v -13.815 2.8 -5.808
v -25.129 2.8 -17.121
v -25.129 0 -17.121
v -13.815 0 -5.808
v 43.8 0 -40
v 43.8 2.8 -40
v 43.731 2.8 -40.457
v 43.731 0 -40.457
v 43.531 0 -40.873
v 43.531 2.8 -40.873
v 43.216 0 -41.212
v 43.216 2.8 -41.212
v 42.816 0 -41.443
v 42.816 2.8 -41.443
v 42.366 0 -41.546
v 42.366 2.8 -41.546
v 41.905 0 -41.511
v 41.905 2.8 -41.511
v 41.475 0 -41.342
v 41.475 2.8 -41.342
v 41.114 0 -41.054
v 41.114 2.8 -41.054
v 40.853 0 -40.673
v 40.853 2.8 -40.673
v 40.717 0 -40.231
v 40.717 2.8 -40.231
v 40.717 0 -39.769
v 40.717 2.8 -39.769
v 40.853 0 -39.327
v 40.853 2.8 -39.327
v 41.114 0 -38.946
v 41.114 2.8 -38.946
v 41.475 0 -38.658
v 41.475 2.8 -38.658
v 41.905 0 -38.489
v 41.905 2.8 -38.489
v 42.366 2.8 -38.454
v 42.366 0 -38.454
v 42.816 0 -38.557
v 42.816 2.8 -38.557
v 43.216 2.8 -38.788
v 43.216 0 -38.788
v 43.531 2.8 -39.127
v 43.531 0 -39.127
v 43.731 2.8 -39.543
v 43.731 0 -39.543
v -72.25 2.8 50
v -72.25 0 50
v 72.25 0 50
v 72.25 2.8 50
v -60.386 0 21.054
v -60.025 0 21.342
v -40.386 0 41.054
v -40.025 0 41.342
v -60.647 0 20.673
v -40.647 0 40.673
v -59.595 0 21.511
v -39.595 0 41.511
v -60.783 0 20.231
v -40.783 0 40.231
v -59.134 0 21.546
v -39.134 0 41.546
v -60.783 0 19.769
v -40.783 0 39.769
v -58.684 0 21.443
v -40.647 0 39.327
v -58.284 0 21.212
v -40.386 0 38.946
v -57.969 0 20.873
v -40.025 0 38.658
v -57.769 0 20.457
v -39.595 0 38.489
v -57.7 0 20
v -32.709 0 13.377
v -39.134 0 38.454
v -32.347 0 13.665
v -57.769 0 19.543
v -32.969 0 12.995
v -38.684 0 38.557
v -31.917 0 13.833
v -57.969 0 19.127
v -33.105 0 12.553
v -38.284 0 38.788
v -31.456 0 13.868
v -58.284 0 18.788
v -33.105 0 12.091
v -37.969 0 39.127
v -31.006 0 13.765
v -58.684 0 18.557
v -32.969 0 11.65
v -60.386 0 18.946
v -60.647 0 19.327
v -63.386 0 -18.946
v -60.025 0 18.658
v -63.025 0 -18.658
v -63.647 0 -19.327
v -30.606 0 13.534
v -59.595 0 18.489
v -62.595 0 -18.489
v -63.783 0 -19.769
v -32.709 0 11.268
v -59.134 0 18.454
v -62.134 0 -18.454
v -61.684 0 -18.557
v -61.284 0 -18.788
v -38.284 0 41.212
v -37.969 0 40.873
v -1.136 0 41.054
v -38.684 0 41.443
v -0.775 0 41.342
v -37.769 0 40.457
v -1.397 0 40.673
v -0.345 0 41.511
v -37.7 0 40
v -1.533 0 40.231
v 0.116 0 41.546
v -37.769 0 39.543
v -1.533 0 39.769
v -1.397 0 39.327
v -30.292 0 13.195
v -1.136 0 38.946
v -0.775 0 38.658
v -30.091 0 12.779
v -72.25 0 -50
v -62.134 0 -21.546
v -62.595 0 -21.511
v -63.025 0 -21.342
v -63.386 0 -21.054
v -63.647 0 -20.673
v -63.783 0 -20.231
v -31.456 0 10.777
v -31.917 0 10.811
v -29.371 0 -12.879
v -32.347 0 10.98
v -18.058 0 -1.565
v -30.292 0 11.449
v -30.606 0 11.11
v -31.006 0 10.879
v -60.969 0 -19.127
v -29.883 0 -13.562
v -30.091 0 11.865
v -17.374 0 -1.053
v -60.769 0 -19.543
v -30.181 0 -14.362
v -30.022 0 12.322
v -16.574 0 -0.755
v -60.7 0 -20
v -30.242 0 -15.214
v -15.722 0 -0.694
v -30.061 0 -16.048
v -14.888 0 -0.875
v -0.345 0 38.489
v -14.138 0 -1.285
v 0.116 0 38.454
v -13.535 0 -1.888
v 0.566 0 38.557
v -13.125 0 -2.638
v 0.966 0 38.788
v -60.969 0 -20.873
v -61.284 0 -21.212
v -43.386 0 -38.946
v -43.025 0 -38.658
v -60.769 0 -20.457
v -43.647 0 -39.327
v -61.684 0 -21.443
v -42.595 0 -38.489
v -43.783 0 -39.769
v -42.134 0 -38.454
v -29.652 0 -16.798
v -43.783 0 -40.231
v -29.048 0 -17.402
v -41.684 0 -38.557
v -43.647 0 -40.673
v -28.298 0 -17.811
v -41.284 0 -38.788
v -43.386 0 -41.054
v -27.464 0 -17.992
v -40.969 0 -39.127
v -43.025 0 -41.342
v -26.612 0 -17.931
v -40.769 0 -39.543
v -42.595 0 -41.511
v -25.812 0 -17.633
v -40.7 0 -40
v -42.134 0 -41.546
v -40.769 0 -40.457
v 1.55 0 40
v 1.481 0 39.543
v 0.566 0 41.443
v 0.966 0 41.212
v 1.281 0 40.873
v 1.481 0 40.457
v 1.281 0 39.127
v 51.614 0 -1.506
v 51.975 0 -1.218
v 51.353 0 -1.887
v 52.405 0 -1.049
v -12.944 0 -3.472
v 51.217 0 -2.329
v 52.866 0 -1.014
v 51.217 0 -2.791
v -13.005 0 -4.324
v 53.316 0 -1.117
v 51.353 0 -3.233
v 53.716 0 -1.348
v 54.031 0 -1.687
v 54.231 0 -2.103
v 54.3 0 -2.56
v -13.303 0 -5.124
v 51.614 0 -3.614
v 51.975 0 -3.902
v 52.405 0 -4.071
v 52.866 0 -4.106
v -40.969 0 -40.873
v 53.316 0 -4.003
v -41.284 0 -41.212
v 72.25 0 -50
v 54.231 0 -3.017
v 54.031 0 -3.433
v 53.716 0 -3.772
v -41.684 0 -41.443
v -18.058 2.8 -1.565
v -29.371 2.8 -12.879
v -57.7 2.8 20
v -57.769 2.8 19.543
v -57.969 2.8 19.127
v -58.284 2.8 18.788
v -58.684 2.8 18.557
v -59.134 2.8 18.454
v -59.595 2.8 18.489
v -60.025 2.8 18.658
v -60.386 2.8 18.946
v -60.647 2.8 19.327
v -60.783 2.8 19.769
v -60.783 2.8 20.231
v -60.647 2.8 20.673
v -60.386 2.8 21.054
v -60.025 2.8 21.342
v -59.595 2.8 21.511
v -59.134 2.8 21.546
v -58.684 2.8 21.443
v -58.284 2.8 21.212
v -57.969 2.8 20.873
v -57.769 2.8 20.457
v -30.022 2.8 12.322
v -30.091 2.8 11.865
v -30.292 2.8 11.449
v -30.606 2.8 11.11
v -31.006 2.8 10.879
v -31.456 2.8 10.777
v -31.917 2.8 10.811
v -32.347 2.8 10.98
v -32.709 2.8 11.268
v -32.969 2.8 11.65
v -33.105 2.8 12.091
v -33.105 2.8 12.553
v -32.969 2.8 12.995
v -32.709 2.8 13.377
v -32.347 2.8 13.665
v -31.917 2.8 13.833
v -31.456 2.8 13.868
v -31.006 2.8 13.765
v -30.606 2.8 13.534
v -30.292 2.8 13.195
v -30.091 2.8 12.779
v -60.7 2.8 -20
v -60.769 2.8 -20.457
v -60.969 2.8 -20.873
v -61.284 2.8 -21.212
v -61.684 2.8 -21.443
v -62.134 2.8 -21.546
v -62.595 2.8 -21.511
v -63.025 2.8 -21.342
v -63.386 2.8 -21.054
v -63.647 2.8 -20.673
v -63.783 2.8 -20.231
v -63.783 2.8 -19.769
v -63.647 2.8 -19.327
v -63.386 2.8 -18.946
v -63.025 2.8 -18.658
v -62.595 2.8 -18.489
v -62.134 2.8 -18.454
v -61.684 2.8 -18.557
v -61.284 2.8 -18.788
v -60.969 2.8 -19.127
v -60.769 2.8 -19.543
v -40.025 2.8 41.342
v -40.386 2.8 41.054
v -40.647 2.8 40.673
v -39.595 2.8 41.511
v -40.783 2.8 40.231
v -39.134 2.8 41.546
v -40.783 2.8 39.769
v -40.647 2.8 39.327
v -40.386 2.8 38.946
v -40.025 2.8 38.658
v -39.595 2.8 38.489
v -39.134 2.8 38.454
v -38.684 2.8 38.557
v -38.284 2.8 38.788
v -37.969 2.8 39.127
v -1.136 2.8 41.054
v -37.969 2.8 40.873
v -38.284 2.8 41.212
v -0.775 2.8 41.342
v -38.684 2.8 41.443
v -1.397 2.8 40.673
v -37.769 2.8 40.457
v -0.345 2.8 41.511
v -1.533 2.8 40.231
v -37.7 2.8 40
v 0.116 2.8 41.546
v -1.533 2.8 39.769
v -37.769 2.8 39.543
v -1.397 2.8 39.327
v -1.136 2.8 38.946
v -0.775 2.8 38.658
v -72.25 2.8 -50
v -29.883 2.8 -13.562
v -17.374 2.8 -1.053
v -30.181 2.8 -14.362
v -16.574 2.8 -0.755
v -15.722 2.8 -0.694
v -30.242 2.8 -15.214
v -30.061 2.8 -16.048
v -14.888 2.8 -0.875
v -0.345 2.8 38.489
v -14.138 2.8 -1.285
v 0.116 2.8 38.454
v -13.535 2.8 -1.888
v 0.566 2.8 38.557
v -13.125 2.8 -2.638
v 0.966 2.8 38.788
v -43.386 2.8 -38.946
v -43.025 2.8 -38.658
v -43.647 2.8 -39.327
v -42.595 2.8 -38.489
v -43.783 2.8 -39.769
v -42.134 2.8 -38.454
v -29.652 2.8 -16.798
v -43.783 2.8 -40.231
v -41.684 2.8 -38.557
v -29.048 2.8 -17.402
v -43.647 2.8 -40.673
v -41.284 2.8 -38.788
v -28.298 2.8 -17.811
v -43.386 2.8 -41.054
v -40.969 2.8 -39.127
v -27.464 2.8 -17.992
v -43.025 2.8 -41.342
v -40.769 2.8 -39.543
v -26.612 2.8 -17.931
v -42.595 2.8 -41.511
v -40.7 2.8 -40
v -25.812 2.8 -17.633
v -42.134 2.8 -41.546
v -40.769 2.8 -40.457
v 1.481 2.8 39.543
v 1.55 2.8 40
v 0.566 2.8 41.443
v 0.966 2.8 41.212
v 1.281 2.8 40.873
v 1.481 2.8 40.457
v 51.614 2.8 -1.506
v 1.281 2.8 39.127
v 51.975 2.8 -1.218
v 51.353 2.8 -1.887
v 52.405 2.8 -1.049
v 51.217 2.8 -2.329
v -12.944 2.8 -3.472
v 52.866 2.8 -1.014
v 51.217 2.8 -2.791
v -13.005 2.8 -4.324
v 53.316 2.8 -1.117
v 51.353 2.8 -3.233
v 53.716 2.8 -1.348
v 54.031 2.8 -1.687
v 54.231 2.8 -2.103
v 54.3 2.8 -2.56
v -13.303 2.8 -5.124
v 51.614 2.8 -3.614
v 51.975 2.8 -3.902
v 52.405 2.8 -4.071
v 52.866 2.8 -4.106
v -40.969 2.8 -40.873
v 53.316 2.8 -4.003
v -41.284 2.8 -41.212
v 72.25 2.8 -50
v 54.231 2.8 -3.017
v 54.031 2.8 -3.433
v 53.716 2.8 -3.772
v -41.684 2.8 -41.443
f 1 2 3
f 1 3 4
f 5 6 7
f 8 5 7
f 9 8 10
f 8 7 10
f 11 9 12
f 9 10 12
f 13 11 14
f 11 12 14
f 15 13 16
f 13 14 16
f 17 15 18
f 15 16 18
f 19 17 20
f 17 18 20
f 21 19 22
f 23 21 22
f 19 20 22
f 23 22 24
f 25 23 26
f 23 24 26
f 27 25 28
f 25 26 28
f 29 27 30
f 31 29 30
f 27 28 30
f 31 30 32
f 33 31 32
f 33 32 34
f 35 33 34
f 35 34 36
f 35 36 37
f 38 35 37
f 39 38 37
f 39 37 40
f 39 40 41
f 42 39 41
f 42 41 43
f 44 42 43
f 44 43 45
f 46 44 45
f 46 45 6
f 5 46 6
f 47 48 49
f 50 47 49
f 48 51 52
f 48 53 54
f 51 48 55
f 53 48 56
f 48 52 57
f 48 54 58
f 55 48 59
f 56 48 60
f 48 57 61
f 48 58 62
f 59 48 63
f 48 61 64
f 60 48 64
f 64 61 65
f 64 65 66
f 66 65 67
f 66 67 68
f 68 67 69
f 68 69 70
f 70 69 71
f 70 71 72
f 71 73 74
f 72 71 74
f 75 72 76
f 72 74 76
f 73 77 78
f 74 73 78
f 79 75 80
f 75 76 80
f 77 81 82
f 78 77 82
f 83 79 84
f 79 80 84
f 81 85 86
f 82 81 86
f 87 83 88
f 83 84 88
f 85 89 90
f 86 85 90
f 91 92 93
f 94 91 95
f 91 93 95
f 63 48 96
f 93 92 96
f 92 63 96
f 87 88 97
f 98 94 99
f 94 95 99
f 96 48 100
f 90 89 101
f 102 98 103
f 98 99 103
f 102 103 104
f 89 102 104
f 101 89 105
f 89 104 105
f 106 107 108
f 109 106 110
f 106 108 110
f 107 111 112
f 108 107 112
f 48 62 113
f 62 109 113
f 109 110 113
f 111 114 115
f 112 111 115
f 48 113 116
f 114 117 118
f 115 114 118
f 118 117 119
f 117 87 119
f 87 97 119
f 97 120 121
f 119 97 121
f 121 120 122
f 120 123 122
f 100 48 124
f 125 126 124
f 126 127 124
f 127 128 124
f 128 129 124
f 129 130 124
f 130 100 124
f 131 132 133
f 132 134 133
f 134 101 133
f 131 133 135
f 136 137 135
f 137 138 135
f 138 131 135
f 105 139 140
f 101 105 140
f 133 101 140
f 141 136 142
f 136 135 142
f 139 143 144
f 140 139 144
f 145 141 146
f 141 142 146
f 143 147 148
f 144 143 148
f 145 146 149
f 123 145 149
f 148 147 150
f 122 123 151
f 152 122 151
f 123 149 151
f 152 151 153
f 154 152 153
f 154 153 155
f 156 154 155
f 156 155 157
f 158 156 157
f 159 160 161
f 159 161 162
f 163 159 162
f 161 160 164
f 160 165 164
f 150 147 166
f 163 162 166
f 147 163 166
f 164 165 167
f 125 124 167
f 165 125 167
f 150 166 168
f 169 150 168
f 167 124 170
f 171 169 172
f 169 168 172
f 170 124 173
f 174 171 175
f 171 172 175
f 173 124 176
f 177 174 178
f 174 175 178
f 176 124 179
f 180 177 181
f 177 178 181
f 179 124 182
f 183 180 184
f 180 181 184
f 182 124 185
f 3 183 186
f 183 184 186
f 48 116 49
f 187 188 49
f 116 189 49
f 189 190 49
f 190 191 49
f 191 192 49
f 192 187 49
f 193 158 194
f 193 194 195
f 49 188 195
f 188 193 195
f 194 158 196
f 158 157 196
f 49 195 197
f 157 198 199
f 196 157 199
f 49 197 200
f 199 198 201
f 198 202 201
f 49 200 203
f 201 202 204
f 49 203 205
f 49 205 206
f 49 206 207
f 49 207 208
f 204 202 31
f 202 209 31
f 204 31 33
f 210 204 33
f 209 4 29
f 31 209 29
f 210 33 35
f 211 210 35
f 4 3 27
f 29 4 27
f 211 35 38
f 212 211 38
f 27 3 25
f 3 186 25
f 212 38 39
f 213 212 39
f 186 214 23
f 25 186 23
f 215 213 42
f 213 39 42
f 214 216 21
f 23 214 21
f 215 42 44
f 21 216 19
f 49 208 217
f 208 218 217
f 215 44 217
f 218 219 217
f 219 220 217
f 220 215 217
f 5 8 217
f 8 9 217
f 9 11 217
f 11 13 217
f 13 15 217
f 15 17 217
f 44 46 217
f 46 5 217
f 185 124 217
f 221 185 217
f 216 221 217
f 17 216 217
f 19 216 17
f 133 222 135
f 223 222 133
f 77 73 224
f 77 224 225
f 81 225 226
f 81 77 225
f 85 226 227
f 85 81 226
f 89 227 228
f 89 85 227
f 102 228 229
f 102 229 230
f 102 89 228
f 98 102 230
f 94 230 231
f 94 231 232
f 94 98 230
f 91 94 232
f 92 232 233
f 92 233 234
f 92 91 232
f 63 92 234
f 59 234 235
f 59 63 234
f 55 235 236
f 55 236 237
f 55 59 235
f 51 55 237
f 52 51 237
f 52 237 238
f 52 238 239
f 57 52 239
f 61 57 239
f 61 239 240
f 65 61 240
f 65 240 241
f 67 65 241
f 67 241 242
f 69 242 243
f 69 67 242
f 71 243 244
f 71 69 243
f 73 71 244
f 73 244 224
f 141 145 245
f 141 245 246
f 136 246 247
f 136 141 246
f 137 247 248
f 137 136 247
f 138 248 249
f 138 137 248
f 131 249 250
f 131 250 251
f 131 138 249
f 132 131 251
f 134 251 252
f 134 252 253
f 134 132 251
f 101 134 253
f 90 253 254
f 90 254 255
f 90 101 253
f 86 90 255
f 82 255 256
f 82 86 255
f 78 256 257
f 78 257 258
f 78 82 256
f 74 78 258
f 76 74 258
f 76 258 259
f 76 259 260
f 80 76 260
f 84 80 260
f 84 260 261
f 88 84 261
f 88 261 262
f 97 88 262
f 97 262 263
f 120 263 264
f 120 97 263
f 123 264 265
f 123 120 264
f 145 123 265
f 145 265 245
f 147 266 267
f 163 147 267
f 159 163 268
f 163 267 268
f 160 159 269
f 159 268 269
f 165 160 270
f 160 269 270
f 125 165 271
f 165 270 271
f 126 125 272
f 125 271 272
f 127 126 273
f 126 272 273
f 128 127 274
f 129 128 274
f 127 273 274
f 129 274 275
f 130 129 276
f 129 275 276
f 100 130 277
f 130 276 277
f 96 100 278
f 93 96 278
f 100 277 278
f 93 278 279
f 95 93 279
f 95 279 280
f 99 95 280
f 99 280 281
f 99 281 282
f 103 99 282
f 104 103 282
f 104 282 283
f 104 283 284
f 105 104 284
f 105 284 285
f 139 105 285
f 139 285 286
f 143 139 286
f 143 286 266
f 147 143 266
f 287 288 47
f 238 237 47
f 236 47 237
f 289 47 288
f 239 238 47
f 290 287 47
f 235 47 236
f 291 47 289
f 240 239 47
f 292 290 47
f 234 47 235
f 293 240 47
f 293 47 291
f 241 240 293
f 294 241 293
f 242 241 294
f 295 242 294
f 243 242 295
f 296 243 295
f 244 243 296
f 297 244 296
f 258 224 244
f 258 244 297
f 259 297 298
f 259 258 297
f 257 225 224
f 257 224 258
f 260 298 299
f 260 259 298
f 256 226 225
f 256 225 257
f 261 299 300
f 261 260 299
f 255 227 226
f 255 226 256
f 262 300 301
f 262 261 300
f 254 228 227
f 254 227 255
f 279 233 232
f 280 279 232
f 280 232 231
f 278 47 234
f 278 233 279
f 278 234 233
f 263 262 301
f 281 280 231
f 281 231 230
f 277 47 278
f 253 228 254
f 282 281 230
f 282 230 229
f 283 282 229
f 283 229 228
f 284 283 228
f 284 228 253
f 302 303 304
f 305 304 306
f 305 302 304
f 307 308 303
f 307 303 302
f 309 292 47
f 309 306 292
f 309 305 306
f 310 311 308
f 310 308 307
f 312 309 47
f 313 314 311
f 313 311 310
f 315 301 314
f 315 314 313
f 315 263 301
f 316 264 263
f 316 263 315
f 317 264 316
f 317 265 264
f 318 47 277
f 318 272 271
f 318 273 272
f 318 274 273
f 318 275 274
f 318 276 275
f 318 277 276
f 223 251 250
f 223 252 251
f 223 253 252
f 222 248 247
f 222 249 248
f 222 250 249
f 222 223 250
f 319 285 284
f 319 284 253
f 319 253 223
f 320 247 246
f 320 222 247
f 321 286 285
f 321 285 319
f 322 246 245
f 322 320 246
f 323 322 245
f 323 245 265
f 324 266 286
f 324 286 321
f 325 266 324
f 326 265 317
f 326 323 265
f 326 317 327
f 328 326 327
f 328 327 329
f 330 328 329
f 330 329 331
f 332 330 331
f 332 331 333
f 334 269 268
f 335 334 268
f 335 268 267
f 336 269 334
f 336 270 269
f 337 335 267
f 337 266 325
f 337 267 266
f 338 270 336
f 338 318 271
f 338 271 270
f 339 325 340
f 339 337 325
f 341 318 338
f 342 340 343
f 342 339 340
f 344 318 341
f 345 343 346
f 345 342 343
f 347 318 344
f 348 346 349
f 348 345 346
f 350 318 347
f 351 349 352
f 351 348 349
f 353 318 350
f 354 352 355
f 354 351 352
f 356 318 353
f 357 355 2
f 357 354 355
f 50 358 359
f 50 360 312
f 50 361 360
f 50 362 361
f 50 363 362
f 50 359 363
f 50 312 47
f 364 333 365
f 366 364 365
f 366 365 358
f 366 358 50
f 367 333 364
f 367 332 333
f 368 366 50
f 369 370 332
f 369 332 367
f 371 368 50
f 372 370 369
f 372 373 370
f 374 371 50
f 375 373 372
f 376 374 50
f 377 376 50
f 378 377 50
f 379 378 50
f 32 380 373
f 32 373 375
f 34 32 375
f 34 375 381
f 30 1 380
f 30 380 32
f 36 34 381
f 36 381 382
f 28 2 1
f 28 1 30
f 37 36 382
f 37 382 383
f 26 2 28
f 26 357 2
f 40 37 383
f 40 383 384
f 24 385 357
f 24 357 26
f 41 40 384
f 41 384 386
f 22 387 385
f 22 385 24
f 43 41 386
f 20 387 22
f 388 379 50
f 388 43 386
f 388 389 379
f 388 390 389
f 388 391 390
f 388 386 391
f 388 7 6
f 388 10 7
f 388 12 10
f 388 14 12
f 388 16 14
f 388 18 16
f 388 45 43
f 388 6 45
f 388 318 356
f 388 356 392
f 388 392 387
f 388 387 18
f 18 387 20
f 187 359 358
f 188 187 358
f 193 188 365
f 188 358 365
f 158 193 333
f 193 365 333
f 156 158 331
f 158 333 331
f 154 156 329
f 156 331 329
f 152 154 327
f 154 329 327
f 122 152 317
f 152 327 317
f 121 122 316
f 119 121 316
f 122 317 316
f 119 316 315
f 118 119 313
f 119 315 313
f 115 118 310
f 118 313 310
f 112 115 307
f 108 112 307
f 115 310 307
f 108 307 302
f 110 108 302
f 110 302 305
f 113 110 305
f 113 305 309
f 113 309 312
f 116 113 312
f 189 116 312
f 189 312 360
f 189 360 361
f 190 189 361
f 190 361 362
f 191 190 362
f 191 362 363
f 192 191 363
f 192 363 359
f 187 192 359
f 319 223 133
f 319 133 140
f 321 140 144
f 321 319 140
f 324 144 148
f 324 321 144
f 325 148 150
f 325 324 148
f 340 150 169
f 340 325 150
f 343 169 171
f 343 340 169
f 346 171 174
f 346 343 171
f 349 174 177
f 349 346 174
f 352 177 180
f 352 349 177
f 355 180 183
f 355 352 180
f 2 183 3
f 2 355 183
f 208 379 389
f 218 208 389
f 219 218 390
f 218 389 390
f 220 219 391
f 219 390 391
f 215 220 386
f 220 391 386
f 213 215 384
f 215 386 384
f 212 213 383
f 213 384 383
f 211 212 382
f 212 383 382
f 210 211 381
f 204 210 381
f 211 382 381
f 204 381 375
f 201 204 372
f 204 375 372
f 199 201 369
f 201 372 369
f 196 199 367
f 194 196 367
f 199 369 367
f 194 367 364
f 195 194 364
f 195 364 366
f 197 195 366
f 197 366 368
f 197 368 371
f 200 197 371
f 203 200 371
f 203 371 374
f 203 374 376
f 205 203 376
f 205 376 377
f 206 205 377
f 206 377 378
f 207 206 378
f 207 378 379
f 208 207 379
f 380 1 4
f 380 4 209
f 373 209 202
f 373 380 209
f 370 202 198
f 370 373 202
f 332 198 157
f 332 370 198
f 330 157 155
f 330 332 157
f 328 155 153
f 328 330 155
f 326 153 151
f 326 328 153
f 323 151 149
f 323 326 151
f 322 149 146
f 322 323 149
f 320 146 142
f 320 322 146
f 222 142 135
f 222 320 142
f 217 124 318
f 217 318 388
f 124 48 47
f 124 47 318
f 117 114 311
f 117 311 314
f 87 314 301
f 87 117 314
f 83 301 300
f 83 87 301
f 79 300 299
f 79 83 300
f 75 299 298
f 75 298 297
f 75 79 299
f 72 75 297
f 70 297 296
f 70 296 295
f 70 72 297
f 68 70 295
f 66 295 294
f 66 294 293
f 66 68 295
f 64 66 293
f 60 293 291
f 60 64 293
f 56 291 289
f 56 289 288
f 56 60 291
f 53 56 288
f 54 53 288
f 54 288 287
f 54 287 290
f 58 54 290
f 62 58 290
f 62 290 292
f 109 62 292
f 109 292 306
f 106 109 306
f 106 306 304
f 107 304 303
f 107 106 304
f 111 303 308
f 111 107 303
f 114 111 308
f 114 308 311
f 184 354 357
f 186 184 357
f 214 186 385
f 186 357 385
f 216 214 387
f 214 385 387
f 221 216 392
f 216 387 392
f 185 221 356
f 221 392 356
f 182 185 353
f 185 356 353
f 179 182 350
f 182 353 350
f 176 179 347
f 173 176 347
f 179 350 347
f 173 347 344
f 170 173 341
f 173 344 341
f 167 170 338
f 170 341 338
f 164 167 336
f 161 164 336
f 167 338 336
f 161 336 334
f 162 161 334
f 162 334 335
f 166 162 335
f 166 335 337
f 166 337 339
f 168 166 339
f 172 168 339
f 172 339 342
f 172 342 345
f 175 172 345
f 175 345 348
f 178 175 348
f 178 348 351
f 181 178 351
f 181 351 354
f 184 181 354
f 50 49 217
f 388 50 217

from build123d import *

# Parameters (mm, degrees)
SKETCH1_W           = 144.5
SKETCH1_H           = 100
SKETCH1_R           = 1.55
BOSS_EXTRUDE1_DEPTH = 2.8
CUT_EXTRUDE1_REACH  = 4.8
CUT_EXTRUDE2_REACH  = 4.8
SKETCH3_R           = 1.55
CUT_EXTRUDE3_REACH  = 4.8
SKETCH4_R           = 1.55


with BuildPart() as part:
    # Sketch1 → Boss-Extrude1 (new body)
    with BuildSketch(Plane(origin=(0, 0, 0), x_dir=(1, 0, 0), z_dir=(0, 1, 0))):
        Rectangle(SKETCH1_W, SKETCH1_H)
        with Locations((-59.25, -20)):
            Circle(SKETCH1_R, mode=Mode.SUBTRACT)
        with Locations((-39.25, -40)):
            Circle(SKETCH1_R, mode=Mode.SUBTRACT)
        with Locations((-31.57233047, -12.32233047)):
            Circle(SKETCH1_R, mode=Mode.SUBTRACT)
    extrude(amount=BOSS_EXTRUDE1_DEPTH)

    # Sketch2 → Cut-Extrude1 (cut, up to next)
    with BuildSketch(Plane(origin=(0, 2.8, 0), x_dir=(1, 0, 0), z_dir=(0, 1, 0)), mode=Mode.PRIVATE) as cut_extrude1_sk1:
        with BuildLine():
            Line((-25.128679656, 17.121320344), (-13.814971157, 5.807611845))
            ThreePointArc((-13.814971157, 5.807611845), (-13.814971157, 1.564971157), (-18.057611845, 1.564971157))
            Line((-18.057611845, 1.564971157), (-29.371320344, 12.878679656))
            ThreePointArc((-29.371320344, 12.878679656), (-29.371320344, 17.121320344), (-25.128679656, 17.121320344))
        make_face()
    cut_extrude1_tool1 = extrude(cut_extrude1_sk1.sketch, amount=-CUT_EXTRUDE1_REACH, mode=Mode.PRIVATE) & part.part
    add(cut_extrude1_tool1.solids().sort_by_distance((-21.593146, 2.8, -9.343146))[0], mode=Mode.SUBTRACT)

    # Sketch3 → Cut-Extrude2 (cut, up to next)
    with BuildSketch(Plane(origin=(0, 2.8, 0), x_dir=(1, 0, 0), z_dir=(0, 1, 0)), mode=Mode.PRIVATE) as cut_extrude2_sk1:
        with Locations((-62.25, 20)):
            Circle(SKETCH3_R)
    cut_extrude2_tool1 = extrude(cut_extrude2_sk1.sketch, amount=-CUT_EXTRUDE2_REACH, mode=Mode.PRIVATE) & part.part
    add(cut_extrude2_tool1.solids().sort_by_distance((-62.25, 2.8, -20))[0], mode=Mode.SUBTRACT)
    # Sketch3 → Cut-Extrude2 (cut, up to next)
    with BuildSketch(Plane(origin=(0, 2.8, 0), x_dir=(1, 0, 0), z_dir=(0, 1, 0)), mode=Mode.PRIVATE) as cut_extrude2_sk2:
        with Locations((-42.25, 40)):
            Circle(SKETCH3_R)
    cut_extrude2_tool2 = extrude(cut_extrude2_sk2.sketch, amount=-CUT_EXTRUDE2_REACH, mode=Mode.PRIVATE) & part.part
    add(cut_extrude2_tool2.solids().sort_by_distance((-42.25, 2.8, -40))[0], mode=Mode.SUBTRACT)
    # Sketch3 → Cut-Extrude2 (cut, up to next)
    with BuildSketch(Plane(origin=(0, 2.8, 0), x_dir=(1, 0, 0), z_dir=(0, 1, 0)), mode=Mode.PRIVATE) as cut_extrude2_sk3:
        with Locations((42.25, 40)):
            Circle(SKETCH3_R)
    cut_extrude2_tool3 = extrude(cut_extrude2_sk3.sketch, amount=-CUT_EXTRUDE2_REACH, mode=Mode.PRIVATE) & part.part
    add(cut_extrude2_tool3.solids().sort_by_distance((42.25, 2.8, -40))[0], mode=Mode.SUBTRACT)
    # Sketch3 → Cut-Extrude2 (cut, up to next)
    with BuildSketch(Plane(origin=(0, 2.8, 0), x_dir=(1, 0, 0), z_dir=(0, 1, 0)), mode=Mode.PRIVATE) as cut_extrude2_sk4:
        with Locations((0, -40)):
            Circle(SKETCH3_R)
    cut_extrude2_tool4 = extrude(cut_extrude2_sk4.sketch, amount=-CUT_EXTRUDE2_REACH, mode=Mode.PRIVATE) & part.part
    add(cut_extrude2_tool4.solids().sort_by_distance((0, 2.8, 40))[0], mode=Mode.SUBTRACT)

    # Sketch4 → Cut-Extrude3 (cut, up to next)
    with BuildSketch(Plane(origin=(0, 2.8, 0), x_dir=(1, 0, 0), z_dir=(0, 1, 0)), mode=Mode.PRIVATE) as cut_extrude3_sk1:
        with Locations((52.75, 2.56)):
            Circle(SKETCH4_R)
    cut_extrude3_tool1 = extrude(cut_extrude3_sk1.sketch, amount=-CUT_EXTRUDE3_REACH, mode=Mode.PRIVATE) & part.part
    add(cut_extrude3_tool1.solids().sort_by_distance((52.75, 2.8, -2.56))[0], mode=Mode.SUBTRACT)


solid = part.part
